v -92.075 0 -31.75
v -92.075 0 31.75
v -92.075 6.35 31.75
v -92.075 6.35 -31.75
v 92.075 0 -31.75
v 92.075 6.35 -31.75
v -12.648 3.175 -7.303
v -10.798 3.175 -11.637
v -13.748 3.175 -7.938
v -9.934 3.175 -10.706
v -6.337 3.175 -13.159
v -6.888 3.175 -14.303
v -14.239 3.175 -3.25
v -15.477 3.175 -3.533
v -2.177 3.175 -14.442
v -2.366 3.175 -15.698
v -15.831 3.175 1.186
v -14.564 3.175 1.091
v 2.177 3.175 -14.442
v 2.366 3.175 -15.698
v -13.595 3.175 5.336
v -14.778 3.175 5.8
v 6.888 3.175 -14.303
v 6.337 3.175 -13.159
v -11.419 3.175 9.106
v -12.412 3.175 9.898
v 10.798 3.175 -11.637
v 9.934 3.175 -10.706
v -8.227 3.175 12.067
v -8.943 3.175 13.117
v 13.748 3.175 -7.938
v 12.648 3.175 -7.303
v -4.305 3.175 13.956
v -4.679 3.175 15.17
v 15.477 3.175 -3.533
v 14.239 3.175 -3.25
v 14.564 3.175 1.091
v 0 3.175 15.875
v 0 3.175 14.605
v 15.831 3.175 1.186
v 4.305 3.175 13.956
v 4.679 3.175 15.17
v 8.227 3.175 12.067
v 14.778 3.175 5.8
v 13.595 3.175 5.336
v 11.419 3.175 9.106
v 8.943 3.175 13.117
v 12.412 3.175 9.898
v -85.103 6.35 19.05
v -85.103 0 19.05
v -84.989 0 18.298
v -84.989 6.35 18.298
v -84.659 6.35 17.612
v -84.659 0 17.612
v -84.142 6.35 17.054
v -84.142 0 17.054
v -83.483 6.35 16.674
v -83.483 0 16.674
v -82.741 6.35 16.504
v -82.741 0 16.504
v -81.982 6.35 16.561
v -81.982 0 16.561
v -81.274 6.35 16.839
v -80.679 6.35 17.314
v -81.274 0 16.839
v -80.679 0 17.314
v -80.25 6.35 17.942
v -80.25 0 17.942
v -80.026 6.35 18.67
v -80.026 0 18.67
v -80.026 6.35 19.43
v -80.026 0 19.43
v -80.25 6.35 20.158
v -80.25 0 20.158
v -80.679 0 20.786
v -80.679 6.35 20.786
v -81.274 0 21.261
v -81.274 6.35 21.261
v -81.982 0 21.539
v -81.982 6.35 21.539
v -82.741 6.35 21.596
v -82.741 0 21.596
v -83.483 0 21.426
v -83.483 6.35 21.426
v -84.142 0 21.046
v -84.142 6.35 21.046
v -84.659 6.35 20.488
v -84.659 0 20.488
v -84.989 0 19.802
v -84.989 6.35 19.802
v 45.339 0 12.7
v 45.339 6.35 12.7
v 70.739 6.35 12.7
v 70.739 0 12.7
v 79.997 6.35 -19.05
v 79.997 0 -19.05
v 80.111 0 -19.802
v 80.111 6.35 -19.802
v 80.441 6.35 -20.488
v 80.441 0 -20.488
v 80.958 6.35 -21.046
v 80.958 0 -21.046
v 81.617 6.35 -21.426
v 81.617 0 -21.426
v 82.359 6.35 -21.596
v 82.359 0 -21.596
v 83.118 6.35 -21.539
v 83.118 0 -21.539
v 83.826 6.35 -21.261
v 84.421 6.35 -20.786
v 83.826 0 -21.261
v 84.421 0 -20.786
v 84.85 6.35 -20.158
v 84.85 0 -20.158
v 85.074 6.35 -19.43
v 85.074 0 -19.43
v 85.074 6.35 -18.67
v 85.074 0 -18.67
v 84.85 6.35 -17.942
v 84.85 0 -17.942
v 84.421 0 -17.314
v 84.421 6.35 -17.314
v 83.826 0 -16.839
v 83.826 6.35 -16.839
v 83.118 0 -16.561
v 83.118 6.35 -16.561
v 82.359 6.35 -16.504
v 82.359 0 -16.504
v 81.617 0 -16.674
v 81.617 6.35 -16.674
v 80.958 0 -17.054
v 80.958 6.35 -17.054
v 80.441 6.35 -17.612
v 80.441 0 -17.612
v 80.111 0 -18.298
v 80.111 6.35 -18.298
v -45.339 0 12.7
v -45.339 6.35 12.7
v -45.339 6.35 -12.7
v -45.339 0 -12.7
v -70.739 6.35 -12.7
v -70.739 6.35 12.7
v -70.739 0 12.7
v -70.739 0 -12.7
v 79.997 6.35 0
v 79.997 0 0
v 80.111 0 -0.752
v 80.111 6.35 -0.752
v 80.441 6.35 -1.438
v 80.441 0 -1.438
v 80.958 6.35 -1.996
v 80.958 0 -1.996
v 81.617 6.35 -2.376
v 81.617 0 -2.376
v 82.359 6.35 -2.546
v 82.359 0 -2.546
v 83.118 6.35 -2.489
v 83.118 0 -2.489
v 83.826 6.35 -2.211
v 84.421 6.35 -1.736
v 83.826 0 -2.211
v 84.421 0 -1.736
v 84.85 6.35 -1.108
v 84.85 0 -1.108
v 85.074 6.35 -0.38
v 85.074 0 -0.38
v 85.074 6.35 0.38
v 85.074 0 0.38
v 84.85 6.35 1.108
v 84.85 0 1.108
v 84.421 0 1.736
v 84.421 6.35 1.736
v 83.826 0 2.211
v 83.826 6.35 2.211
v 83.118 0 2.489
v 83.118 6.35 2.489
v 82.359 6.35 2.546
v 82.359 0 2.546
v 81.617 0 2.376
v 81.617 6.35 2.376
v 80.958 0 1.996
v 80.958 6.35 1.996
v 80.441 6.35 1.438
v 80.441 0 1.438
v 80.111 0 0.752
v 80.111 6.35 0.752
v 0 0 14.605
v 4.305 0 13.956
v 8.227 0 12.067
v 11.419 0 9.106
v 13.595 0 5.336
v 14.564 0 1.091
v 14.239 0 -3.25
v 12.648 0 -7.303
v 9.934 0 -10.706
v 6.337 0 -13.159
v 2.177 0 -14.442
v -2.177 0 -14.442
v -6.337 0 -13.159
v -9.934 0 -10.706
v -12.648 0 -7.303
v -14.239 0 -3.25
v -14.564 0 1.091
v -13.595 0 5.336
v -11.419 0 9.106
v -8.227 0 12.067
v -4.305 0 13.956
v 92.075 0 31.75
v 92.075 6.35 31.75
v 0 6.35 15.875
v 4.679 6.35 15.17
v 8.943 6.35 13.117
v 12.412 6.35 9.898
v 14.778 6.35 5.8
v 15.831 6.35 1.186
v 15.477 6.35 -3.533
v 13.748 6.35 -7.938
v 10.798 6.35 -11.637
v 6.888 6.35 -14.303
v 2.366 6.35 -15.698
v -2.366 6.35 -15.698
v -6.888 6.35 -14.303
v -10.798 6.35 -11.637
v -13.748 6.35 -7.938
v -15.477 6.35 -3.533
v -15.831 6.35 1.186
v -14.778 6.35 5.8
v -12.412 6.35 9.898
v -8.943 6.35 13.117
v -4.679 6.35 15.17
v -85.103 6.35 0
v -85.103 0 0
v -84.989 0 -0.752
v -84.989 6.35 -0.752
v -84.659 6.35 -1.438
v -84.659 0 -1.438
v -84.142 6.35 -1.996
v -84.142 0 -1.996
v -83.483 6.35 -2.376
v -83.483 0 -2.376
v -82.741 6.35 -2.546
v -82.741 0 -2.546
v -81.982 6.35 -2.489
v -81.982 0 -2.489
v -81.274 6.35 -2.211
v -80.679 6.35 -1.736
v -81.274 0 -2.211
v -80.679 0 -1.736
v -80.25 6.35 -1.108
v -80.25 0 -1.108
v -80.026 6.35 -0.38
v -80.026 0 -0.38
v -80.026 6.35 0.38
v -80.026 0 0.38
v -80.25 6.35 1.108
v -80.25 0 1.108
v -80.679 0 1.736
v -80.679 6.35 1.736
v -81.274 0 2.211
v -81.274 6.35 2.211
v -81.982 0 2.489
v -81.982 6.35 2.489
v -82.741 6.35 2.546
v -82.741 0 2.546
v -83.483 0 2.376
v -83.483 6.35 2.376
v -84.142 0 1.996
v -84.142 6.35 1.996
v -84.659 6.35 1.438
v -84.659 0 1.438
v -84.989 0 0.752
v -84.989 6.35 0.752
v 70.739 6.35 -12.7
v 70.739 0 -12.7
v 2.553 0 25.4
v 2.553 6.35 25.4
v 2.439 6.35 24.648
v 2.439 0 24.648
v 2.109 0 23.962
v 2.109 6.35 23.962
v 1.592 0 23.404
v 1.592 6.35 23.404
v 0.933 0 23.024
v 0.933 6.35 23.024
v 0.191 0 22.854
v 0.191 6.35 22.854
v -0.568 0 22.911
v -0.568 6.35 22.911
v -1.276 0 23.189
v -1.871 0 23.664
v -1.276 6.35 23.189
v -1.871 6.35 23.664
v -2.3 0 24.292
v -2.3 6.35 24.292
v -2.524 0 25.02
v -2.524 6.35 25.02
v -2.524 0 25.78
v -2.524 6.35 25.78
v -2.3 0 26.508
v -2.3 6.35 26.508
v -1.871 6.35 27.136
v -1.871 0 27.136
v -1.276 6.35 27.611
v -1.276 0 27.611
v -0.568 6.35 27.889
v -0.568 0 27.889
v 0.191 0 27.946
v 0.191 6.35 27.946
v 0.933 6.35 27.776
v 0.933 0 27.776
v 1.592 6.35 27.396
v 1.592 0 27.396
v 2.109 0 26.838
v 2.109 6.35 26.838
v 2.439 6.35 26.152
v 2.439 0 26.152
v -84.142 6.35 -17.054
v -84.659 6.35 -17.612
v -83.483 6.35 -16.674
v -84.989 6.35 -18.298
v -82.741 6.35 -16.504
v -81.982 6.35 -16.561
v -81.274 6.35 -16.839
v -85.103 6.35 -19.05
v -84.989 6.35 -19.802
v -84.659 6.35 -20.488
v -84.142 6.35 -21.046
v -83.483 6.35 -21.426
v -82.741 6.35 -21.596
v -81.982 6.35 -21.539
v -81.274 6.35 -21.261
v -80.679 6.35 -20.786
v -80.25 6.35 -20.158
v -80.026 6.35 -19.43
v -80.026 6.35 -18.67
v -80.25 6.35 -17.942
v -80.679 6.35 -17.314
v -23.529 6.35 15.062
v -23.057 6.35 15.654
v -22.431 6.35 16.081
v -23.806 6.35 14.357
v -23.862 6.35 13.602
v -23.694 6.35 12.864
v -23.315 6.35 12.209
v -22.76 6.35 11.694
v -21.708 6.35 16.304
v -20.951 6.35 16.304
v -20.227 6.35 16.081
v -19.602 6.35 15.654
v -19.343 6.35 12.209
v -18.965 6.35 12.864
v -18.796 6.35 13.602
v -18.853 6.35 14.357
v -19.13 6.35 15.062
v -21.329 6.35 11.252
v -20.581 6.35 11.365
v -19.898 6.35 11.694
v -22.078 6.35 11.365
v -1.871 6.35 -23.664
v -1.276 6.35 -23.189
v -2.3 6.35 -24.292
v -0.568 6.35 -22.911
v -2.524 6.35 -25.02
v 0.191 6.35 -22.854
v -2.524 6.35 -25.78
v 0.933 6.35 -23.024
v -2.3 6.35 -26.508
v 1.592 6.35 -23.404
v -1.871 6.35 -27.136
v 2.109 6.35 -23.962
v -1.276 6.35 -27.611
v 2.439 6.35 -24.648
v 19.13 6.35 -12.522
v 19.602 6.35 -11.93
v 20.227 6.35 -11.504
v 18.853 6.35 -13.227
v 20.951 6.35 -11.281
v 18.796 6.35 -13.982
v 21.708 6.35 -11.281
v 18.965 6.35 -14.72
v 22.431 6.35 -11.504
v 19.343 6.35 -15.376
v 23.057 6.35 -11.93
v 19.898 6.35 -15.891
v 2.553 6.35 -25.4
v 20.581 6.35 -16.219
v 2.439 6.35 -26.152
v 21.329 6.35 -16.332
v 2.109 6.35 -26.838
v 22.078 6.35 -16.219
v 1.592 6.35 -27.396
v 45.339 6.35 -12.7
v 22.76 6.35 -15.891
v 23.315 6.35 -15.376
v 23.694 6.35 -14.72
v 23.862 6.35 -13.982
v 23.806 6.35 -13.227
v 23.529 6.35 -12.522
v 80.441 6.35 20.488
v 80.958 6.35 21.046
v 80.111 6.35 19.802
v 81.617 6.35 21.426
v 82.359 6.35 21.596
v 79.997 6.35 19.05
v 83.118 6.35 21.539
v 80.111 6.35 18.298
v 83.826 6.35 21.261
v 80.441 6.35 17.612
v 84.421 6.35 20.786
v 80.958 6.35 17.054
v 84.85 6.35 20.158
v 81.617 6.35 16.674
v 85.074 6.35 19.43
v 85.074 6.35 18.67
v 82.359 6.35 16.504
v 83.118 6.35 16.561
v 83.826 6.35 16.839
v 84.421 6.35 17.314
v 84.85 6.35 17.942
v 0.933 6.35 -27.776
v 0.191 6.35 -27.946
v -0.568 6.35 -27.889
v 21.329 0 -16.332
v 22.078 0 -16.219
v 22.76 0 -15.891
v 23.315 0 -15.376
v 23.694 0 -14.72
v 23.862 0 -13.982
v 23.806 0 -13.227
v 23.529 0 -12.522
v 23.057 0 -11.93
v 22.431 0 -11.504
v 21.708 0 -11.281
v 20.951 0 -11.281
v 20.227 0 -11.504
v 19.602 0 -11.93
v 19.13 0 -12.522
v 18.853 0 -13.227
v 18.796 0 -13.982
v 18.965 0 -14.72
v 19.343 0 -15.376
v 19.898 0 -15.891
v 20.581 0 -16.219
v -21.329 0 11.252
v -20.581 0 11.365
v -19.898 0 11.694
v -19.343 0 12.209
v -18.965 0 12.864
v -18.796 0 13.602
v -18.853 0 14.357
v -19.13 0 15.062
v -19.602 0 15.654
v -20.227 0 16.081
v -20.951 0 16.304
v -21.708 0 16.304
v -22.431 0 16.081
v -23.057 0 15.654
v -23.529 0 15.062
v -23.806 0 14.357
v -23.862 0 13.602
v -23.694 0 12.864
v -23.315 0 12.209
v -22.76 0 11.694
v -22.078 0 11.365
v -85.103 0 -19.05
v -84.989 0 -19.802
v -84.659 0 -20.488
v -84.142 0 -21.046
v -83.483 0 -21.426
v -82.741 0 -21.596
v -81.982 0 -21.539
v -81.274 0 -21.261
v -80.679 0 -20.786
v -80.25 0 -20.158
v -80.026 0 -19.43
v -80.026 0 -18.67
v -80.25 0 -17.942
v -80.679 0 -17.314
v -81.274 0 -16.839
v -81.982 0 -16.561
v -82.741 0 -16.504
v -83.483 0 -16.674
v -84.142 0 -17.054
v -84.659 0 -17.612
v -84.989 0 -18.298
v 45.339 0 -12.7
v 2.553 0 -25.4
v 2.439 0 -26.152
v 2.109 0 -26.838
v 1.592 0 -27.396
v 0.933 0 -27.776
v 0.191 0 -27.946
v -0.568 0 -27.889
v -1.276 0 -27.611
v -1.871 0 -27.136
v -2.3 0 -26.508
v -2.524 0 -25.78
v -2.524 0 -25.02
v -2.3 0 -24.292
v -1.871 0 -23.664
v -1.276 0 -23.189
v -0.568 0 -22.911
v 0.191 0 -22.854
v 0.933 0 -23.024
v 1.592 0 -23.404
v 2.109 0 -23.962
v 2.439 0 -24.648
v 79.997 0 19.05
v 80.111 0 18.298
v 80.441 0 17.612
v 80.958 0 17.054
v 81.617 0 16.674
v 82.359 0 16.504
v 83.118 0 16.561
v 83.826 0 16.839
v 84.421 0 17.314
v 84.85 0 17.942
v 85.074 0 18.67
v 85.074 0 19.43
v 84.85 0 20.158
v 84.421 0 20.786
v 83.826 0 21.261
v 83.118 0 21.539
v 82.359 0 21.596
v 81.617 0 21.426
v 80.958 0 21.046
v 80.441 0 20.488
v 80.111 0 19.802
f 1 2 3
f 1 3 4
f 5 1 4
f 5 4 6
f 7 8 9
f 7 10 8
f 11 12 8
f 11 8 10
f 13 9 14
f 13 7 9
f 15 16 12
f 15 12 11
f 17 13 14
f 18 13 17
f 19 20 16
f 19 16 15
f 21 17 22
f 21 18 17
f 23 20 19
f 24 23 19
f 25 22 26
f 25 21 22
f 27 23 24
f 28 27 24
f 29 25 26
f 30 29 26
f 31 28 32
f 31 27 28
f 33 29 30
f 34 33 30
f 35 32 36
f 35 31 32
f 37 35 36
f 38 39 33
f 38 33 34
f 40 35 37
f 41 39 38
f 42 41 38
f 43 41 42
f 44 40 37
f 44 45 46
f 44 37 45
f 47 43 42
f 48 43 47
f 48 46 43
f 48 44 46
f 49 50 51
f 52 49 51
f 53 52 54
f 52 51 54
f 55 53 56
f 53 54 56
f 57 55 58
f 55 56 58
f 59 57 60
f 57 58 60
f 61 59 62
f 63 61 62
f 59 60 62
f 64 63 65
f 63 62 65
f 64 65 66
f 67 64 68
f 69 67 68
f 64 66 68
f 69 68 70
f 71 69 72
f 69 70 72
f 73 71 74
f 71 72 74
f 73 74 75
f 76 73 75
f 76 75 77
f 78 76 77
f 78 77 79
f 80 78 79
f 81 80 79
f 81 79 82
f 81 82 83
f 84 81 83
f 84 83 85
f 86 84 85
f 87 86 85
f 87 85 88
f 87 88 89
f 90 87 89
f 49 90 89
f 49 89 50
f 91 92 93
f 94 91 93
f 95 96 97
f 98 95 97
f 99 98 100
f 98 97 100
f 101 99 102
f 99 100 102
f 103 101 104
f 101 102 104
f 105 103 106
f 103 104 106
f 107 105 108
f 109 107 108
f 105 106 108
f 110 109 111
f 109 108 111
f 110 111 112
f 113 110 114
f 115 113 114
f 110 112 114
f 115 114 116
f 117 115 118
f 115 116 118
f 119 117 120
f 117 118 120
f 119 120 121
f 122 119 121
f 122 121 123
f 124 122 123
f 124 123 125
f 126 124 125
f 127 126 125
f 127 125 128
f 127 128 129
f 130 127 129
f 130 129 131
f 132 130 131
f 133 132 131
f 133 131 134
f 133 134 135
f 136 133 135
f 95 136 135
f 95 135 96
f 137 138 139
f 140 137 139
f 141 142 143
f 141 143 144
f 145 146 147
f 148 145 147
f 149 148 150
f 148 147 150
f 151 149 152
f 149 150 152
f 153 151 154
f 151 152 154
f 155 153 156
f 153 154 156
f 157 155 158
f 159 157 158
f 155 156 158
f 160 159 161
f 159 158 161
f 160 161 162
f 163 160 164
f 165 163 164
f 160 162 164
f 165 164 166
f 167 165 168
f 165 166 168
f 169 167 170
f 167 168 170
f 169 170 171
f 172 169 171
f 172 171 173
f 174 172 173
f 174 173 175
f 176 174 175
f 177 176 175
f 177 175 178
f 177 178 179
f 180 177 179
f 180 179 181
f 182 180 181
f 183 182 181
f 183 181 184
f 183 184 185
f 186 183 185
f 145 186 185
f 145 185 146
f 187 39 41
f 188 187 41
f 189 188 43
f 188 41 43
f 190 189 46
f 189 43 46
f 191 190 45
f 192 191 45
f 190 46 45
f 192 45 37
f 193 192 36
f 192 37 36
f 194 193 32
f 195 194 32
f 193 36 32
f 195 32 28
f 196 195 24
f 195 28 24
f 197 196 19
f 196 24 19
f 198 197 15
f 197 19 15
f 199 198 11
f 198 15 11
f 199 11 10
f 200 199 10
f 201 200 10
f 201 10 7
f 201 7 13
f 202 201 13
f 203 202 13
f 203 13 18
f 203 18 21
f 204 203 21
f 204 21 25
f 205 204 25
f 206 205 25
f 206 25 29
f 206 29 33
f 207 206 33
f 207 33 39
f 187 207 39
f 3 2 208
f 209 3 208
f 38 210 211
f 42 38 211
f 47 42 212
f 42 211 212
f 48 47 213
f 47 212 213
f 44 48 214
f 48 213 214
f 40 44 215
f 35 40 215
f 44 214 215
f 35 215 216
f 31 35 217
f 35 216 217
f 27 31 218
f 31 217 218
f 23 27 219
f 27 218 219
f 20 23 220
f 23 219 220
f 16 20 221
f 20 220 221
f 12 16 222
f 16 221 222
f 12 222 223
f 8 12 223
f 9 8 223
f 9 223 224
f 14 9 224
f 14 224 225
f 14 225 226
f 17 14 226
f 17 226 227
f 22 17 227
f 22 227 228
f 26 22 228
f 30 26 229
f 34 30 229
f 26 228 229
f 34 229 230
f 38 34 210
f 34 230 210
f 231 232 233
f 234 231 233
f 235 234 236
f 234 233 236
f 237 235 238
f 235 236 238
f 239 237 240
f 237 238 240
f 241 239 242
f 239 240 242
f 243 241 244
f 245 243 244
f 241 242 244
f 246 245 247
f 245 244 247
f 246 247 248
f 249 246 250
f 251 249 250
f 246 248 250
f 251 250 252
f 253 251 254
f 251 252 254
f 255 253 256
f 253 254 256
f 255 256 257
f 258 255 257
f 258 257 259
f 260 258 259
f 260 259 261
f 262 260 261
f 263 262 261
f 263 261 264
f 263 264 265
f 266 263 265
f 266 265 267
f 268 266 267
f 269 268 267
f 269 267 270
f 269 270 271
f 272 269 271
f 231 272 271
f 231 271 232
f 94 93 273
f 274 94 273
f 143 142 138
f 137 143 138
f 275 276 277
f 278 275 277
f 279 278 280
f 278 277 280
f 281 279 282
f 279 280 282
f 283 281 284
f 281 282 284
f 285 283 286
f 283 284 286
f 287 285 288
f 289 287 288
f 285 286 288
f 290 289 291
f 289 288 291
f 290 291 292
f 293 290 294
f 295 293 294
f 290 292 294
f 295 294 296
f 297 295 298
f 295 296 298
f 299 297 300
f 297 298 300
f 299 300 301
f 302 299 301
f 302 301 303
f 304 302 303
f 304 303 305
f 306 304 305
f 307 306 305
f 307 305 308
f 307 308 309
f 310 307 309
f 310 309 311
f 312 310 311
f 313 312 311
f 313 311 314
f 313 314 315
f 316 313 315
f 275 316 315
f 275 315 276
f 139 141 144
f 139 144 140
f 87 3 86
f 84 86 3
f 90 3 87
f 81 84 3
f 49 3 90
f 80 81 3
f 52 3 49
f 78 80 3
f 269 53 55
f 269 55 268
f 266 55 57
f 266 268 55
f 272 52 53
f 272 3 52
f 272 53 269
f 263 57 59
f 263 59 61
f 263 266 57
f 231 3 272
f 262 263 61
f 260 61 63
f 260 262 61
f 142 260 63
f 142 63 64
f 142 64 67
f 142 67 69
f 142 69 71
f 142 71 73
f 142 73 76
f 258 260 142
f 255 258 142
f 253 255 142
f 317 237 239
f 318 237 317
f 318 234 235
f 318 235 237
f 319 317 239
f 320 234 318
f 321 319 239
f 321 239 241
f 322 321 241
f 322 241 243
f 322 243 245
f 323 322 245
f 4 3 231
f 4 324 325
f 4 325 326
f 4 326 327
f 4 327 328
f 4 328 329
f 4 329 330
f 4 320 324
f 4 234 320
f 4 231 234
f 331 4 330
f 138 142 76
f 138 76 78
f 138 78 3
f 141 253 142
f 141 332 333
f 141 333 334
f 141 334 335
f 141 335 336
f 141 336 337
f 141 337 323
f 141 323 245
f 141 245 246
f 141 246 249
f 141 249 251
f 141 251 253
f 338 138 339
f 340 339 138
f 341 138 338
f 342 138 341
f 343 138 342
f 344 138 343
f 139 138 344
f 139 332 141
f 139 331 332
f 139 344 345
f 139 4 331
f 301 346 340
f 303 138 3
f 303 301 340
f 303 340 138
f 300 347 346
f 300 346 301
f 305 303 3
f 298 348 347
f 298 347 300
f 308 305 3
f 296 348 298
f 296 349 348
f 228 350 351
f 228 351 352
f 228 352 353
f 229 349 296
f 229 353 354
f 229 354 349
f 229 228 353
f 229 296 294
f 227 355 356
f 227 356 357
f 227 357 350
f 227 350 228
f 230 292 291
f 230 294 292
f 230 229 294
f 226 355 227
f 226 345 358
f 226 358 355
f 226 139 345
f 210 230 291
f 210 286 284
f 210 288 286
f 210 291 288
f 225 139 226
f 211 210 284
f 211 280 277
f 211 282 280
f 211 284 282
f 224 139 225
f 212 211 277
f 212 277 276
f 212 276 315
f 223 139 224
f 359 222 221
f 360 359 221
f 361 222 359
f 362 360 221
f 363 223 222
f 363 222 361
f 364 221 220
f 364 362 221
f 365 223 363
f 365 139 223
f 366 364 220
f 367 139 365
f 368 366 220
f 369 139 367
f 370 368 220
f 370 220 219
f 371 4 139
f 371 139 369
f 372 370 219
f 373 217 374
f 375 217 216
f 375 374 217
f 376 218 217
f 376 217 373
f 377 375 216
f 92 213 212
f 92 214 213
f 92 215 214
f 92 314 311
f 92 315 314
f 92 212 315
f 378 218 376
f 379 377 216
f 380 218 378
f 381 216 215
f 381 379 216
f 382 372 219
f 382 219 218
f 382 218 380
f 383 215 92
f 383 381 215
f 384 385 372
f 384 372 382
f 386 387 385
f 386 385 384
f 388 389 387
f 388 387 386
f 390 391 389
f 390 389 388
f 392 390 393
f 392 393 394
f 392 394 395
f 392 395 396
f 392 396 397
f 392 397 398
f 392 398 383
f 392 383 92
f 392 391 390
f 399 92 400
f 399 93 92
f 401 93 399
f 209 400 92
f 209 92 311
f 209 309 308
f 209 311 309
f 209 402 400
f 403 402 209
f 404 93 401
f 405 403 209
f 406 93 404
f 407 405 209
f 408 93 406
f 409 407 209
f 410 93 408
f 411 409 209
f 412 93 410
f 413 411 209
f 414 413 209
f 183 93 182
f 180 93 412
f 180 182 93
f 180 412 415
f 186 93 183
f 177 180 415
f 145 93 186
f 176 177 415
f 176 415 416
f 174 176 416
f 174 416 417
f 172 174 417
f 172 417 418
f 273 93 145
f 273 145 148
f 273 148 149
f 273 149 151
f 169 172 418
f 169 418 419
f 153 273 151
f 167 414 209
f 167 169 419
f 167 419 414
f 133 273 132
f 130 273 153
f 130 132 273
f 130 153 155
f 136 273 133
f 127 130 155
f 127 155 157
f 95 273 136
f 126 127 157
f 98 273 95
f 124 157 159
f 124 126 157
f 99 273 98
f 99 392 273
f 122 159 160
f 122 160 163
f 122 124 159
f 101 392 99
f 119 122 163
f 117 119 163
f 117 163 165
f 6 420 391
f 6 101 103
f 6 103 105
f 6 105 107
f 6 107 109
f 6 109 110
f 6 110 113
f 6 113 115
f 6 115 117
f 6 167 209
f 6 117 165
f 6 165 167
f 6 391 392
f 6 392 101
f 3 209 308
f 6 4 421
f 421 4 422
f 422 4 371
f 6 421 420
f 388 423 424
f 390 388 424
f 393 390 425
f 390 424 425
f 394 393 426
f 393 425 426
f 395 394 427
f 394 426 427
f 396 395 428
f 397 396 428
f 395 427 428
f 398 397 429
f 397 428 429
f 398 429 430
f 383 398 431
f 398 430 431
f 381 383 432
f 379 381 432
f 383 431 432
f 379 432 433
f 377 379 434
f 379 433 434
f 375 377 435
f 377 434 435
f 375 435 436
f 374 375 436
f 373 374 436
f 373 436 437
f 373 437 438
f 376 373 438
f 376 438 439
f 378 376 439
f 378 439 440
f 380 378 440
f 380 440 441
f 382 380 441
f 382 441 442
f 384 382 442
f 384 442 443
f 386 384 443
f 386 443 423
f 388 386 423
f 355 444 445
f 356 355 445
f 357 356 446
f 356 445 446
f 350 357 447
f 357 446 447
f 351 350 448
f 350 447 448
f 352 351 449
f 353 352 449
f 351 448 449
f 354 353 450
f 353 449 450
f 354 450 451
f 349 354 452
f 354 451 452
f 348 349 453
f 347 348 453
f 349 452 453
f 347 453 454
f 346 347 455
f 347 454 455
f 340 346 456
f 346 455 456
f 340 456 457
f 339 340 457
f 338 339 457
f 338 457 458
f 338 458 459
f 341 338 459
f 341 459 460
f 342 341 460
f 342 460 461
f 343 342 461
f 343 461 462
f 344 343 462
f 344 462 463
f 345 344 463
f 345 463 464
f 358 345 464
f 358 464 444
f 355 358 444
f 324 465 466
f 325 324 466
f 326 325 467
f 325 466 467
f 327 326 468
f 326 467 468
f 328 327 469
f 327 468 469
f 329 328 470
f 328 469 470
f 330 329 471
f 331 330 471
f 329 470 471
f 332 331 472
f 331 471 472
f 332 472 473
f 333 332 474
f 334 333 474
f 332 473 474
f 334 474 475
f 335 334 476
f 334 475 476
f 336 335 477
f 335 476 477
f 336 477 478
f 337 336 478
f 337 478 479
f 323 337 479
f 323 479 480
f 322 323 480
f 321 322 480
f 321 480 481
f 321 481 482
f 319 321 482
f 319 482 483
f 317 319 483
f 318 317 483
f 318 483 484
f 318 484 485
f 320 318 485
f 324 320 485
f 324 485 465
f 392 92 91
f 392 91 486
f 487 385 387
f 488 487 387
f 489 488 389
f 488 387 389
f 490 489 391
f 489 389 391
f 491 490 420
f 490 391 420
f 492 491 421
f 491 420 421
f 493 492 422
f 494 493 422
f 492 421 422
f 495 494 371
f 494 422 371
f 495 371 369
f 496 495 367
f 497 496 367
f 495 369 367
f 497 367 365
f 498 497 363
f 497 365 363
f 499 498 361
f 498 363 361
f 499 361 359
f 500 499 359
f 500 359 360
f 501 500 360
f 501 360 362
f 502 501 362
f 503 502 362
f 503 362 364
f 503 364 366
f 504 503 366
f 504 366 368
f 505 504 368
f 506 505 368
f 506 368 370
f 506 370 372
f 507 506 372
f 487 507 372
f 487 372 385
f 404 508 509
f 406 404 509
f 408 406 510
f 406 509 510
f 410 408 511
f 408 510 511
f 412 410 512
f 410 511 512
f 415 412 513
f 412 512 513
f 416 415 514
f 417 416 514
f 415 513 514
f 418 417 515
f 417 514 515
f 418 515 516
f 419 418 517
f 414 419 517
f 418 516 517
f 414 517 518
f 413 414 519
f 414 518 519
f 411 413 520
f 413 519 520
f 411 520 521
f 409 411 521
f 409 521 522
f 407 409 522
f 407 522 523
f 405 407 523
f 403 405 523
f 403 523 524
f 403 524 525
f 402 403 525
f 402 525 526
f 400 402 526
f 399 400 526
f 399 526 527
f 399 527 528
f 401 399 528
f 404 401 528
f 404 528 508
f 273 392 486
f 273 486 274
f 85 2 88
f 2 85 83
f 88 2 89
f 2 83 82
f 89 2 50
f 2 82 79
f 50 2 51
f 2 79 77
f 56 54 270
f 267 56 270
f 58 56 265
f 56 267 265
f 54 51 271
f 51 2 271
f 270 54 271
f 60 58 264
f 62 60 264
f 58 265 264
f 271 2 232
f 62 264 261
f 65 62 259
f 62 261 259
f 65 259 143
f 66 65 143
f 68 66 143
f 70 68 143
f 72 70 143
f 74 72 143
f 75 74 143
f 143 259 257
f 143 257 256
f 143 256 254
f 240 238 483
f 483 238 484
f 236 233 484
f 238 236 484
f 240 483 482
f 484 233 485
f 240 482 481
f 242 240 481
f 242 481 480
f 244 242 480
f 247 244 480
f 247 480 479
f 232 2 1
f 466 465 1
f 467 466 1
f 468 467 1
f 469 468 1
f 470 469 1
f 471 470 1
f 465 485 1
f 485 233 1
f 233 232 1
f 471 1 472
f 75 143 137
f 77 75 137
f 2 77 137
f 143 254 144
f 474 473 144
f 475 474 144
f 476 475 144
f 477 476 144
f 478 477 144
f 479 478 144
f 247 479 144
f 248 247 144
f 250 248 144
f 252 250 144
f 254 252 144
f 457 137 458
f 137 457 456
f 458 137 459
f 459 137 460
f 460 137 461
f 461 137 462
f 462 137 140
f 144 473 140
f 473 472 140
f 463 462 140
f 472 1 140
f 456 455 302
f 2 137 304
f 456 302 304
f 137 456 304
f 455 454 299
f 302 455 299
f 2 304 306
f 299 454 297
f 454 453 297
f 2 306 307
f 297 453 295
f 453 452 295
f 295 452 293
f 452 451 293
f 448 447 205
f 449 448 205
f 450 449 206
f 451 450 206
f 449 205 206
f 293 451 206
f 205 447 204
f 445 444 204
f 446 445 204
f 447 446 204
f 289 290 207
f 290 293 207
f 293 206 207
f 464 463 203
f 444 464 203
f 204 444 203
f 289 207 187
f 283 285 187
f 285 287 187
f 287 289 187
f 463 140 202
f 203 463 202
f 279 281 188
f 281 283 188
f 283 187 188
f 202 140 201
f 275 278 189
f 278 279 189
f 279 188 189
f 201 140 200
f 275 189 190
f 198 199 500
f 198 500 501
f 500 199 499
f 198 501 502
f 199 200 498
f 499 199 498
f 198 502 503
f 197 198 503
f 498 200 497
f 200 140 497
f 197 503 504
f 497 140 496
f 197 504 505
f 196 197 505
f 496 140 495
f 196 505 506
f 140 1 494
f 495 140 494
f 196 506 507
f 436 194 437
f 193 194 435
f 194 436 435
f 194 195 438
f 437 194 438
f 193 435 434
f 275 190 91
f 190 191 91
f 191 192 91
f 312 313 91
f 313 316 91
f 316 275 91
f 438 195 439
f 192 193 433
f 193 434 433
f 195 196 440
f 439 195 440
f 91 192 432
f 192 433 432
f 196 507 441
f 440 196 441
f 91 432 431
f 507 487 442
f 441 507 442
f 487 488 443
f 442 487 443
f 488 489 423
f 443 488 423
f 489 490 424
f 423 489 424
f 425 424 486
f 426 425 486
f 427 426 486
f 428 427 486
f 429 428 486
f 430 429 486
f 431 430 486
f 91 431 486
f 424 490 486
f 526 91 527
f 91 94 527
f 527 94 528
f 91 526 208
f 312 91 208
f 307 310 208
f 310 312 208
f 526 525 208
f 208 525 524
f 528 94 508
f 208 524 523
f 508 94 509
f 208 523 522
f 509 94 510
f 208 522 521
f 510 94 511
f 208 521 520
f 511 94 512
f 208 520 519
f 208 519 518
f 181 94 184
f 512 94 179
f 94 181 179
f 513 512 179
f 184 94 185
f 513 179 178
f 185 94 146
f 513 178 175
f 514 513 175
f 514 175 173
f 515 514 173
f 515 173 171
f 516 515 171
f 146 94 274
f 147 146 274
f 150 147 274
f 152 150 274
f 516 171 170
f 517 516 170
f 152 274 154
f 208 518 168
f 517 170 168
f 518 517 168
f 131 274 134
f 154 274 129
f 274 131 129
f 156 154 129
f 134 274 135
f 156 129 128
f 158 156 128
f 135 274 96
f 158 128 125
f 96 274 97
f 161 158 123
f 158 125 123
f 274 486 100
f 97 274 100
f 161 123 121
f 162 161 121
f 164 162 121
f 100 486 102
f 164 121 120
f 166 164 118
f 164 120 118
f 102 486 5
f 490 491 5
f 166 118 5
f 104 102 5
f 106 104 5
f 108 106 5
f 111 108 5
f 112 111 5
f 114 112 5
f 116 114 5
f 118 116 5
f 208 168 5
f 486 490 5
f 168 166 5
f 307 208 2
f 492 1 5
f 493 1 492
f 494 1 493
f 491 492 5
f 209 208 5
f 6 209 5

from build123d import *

# Parameters (mm, degrees)
SKETCH1_W                  = 184.15
SKETCH1_H                  = 63.5
BOSS_EXTRUDE1_DEPTH        = 6.35
SKETCH3_R                  = 14.605
CUT_EXTRUDE1_DEPTH         = 98.602206046
F_10_CLEARANCE_HOLE1_D     = 5.1054
F_6_5_6_5_DIAMETER_HOLE3_D = 6.5
SKETCH29_R                 = 15.875
CUT_EXTRUDE5_DEPTH         = 3.175
F_10_CLEARANCE_HOLE2_D     = 5.1054
SKETCH36_R                 = 2.54
CUT_EXTRUDE6_DEPTH         = 98.602206046
SKETCH37_W                 = 25.4
SKETCH37_H                 = 25.4
CUT_EXTRUDE7_DEPTH         = 98.602206046
SKETCH38_W                 = 25.4
SKETCH38_H                 = 25.4
CUT_EXTRUDE8_DEPTH         = 98.602206046


with BuildPart() as part:
    # Sketch1 → Boss-Extrude1 (new body)
    with BuildSketch(Plane(origin=(0, 0, 0), x_dir=(1, 0, 0), z_dir=(0, 1, 0))):
        Rectangle(SKETCH1_W, SKETCH1_H)
    extrude(amount=BOSS_EXTRUDE1_DEPTH)

    # Sketch3 → Cut-Extrude1 (cut, through all)
    with BuildSketch(Plane(origin=(0, 6.35, 0), x_dir=(1, 0, 0), z_dir=(0, 1, 0))):
        with Locations(Location((0, 0, 0), (0, 0, 270))):
            Circle(SKETCH3_R)
    extrude(amount=-CUT_EXTRUDE1_DEPTH, mode=Mode.SUBTRACT)

    # #10 Clearance Hole1 (through all)
    with Locations(Plane(origin=(0, 0, 0), x_dir=(-1, 0, 0), z_dir=(0, -1, 0))):
        with Locations((0, -25.4), (0, 25.4)):
            Hole(F_10_CLEARANCE_HOLE1_D / 2)

    # Ø6.5 (6.5) Diameter Hole3 (through all)
    with Locations(Plane(origin=(0, 0, 0), x_dir=(-1, 0, 0), z_dir=(0, -1, 0))):
        with Locations((58.039, 0), (-58.039, 0)):
            Hole(F_6_5_6_5_DIAMETER_HOLE3_D / 2)

    # Sketch29 → Cut-Extrude5 (cut)
    with BuildSketch(Plane(origin=(0, 6.35, 0), x_dir=(1, 0, 0), z_dir=(0, 1, 0))):
        with Locations(Location((0, 0, 0), (0, 0, 270))):
            Circle(SKETCH29_R)
    extrude(amount=-CUT_EXTRUDE5_DEPTH, mode=Mode.SUBTRACT)

    # #10 Clearance Hole2 (through all)
    with Locations(Plane(origin=(0, 6.35, 0), x_dir=(1, 0, 0), z_dir=(0, 1, 0))):
        with Locations((-82.55, 19.05), (-82.55, -19.05), (82.55, -19.05), (82.55, 19.05), (-82.55, 0), (82.55, 0)):
            Hole(F_10_CLEARANCE_HOLE2_D / 2)

    # Sketch36 → Cut-Extrude6 (cut, through all)
    with BuildSketch(Plane.XZ):
        with Locations(Location((-21.329210467, 13.7922, 0), (0, 0, 270))):
            Circle(SKETCH36_R)
        with Locations(Location((21.329210467, -13.7922, 0), (0, 0, 270))):
            Circle(SKETCH36_R)
    extrude(amount=-CUT_EXTRUDE6_DEPTH, mode=Mode.SUBTRACT)

    # Sketch37 → Cut-Extrude7 (cut, through all)
    with BuildSketch(Plane(origin=(0, 6.35, 0), x_dir=(1, 0, 0), z_dir=(0, 1, 0))):
        with Locations((-58.039, 0)):
            Rectangle(SKETCH37_W, SKETCH37_H)
    extrude(amount=-CUT_EXTRUDE7_DEPTH, mode=Mode.SUBTRACT)

    # Sketch38 → Cut-Extrude8 (cut, through all)
    with BuildSketch(Plane(origin=(0, 6.35, 0), x_dir=(1, 0, 0), z_dir=(0, 1, 0))):
        with Locations((58.039, 0)):
            Rectangle(SKETCH38_W, SKETCH38_H)
    extrude(amount=-CUT_EXTRUDE8_DEPTH, mode=Mode.SUBTRACT)


solid = part.part
